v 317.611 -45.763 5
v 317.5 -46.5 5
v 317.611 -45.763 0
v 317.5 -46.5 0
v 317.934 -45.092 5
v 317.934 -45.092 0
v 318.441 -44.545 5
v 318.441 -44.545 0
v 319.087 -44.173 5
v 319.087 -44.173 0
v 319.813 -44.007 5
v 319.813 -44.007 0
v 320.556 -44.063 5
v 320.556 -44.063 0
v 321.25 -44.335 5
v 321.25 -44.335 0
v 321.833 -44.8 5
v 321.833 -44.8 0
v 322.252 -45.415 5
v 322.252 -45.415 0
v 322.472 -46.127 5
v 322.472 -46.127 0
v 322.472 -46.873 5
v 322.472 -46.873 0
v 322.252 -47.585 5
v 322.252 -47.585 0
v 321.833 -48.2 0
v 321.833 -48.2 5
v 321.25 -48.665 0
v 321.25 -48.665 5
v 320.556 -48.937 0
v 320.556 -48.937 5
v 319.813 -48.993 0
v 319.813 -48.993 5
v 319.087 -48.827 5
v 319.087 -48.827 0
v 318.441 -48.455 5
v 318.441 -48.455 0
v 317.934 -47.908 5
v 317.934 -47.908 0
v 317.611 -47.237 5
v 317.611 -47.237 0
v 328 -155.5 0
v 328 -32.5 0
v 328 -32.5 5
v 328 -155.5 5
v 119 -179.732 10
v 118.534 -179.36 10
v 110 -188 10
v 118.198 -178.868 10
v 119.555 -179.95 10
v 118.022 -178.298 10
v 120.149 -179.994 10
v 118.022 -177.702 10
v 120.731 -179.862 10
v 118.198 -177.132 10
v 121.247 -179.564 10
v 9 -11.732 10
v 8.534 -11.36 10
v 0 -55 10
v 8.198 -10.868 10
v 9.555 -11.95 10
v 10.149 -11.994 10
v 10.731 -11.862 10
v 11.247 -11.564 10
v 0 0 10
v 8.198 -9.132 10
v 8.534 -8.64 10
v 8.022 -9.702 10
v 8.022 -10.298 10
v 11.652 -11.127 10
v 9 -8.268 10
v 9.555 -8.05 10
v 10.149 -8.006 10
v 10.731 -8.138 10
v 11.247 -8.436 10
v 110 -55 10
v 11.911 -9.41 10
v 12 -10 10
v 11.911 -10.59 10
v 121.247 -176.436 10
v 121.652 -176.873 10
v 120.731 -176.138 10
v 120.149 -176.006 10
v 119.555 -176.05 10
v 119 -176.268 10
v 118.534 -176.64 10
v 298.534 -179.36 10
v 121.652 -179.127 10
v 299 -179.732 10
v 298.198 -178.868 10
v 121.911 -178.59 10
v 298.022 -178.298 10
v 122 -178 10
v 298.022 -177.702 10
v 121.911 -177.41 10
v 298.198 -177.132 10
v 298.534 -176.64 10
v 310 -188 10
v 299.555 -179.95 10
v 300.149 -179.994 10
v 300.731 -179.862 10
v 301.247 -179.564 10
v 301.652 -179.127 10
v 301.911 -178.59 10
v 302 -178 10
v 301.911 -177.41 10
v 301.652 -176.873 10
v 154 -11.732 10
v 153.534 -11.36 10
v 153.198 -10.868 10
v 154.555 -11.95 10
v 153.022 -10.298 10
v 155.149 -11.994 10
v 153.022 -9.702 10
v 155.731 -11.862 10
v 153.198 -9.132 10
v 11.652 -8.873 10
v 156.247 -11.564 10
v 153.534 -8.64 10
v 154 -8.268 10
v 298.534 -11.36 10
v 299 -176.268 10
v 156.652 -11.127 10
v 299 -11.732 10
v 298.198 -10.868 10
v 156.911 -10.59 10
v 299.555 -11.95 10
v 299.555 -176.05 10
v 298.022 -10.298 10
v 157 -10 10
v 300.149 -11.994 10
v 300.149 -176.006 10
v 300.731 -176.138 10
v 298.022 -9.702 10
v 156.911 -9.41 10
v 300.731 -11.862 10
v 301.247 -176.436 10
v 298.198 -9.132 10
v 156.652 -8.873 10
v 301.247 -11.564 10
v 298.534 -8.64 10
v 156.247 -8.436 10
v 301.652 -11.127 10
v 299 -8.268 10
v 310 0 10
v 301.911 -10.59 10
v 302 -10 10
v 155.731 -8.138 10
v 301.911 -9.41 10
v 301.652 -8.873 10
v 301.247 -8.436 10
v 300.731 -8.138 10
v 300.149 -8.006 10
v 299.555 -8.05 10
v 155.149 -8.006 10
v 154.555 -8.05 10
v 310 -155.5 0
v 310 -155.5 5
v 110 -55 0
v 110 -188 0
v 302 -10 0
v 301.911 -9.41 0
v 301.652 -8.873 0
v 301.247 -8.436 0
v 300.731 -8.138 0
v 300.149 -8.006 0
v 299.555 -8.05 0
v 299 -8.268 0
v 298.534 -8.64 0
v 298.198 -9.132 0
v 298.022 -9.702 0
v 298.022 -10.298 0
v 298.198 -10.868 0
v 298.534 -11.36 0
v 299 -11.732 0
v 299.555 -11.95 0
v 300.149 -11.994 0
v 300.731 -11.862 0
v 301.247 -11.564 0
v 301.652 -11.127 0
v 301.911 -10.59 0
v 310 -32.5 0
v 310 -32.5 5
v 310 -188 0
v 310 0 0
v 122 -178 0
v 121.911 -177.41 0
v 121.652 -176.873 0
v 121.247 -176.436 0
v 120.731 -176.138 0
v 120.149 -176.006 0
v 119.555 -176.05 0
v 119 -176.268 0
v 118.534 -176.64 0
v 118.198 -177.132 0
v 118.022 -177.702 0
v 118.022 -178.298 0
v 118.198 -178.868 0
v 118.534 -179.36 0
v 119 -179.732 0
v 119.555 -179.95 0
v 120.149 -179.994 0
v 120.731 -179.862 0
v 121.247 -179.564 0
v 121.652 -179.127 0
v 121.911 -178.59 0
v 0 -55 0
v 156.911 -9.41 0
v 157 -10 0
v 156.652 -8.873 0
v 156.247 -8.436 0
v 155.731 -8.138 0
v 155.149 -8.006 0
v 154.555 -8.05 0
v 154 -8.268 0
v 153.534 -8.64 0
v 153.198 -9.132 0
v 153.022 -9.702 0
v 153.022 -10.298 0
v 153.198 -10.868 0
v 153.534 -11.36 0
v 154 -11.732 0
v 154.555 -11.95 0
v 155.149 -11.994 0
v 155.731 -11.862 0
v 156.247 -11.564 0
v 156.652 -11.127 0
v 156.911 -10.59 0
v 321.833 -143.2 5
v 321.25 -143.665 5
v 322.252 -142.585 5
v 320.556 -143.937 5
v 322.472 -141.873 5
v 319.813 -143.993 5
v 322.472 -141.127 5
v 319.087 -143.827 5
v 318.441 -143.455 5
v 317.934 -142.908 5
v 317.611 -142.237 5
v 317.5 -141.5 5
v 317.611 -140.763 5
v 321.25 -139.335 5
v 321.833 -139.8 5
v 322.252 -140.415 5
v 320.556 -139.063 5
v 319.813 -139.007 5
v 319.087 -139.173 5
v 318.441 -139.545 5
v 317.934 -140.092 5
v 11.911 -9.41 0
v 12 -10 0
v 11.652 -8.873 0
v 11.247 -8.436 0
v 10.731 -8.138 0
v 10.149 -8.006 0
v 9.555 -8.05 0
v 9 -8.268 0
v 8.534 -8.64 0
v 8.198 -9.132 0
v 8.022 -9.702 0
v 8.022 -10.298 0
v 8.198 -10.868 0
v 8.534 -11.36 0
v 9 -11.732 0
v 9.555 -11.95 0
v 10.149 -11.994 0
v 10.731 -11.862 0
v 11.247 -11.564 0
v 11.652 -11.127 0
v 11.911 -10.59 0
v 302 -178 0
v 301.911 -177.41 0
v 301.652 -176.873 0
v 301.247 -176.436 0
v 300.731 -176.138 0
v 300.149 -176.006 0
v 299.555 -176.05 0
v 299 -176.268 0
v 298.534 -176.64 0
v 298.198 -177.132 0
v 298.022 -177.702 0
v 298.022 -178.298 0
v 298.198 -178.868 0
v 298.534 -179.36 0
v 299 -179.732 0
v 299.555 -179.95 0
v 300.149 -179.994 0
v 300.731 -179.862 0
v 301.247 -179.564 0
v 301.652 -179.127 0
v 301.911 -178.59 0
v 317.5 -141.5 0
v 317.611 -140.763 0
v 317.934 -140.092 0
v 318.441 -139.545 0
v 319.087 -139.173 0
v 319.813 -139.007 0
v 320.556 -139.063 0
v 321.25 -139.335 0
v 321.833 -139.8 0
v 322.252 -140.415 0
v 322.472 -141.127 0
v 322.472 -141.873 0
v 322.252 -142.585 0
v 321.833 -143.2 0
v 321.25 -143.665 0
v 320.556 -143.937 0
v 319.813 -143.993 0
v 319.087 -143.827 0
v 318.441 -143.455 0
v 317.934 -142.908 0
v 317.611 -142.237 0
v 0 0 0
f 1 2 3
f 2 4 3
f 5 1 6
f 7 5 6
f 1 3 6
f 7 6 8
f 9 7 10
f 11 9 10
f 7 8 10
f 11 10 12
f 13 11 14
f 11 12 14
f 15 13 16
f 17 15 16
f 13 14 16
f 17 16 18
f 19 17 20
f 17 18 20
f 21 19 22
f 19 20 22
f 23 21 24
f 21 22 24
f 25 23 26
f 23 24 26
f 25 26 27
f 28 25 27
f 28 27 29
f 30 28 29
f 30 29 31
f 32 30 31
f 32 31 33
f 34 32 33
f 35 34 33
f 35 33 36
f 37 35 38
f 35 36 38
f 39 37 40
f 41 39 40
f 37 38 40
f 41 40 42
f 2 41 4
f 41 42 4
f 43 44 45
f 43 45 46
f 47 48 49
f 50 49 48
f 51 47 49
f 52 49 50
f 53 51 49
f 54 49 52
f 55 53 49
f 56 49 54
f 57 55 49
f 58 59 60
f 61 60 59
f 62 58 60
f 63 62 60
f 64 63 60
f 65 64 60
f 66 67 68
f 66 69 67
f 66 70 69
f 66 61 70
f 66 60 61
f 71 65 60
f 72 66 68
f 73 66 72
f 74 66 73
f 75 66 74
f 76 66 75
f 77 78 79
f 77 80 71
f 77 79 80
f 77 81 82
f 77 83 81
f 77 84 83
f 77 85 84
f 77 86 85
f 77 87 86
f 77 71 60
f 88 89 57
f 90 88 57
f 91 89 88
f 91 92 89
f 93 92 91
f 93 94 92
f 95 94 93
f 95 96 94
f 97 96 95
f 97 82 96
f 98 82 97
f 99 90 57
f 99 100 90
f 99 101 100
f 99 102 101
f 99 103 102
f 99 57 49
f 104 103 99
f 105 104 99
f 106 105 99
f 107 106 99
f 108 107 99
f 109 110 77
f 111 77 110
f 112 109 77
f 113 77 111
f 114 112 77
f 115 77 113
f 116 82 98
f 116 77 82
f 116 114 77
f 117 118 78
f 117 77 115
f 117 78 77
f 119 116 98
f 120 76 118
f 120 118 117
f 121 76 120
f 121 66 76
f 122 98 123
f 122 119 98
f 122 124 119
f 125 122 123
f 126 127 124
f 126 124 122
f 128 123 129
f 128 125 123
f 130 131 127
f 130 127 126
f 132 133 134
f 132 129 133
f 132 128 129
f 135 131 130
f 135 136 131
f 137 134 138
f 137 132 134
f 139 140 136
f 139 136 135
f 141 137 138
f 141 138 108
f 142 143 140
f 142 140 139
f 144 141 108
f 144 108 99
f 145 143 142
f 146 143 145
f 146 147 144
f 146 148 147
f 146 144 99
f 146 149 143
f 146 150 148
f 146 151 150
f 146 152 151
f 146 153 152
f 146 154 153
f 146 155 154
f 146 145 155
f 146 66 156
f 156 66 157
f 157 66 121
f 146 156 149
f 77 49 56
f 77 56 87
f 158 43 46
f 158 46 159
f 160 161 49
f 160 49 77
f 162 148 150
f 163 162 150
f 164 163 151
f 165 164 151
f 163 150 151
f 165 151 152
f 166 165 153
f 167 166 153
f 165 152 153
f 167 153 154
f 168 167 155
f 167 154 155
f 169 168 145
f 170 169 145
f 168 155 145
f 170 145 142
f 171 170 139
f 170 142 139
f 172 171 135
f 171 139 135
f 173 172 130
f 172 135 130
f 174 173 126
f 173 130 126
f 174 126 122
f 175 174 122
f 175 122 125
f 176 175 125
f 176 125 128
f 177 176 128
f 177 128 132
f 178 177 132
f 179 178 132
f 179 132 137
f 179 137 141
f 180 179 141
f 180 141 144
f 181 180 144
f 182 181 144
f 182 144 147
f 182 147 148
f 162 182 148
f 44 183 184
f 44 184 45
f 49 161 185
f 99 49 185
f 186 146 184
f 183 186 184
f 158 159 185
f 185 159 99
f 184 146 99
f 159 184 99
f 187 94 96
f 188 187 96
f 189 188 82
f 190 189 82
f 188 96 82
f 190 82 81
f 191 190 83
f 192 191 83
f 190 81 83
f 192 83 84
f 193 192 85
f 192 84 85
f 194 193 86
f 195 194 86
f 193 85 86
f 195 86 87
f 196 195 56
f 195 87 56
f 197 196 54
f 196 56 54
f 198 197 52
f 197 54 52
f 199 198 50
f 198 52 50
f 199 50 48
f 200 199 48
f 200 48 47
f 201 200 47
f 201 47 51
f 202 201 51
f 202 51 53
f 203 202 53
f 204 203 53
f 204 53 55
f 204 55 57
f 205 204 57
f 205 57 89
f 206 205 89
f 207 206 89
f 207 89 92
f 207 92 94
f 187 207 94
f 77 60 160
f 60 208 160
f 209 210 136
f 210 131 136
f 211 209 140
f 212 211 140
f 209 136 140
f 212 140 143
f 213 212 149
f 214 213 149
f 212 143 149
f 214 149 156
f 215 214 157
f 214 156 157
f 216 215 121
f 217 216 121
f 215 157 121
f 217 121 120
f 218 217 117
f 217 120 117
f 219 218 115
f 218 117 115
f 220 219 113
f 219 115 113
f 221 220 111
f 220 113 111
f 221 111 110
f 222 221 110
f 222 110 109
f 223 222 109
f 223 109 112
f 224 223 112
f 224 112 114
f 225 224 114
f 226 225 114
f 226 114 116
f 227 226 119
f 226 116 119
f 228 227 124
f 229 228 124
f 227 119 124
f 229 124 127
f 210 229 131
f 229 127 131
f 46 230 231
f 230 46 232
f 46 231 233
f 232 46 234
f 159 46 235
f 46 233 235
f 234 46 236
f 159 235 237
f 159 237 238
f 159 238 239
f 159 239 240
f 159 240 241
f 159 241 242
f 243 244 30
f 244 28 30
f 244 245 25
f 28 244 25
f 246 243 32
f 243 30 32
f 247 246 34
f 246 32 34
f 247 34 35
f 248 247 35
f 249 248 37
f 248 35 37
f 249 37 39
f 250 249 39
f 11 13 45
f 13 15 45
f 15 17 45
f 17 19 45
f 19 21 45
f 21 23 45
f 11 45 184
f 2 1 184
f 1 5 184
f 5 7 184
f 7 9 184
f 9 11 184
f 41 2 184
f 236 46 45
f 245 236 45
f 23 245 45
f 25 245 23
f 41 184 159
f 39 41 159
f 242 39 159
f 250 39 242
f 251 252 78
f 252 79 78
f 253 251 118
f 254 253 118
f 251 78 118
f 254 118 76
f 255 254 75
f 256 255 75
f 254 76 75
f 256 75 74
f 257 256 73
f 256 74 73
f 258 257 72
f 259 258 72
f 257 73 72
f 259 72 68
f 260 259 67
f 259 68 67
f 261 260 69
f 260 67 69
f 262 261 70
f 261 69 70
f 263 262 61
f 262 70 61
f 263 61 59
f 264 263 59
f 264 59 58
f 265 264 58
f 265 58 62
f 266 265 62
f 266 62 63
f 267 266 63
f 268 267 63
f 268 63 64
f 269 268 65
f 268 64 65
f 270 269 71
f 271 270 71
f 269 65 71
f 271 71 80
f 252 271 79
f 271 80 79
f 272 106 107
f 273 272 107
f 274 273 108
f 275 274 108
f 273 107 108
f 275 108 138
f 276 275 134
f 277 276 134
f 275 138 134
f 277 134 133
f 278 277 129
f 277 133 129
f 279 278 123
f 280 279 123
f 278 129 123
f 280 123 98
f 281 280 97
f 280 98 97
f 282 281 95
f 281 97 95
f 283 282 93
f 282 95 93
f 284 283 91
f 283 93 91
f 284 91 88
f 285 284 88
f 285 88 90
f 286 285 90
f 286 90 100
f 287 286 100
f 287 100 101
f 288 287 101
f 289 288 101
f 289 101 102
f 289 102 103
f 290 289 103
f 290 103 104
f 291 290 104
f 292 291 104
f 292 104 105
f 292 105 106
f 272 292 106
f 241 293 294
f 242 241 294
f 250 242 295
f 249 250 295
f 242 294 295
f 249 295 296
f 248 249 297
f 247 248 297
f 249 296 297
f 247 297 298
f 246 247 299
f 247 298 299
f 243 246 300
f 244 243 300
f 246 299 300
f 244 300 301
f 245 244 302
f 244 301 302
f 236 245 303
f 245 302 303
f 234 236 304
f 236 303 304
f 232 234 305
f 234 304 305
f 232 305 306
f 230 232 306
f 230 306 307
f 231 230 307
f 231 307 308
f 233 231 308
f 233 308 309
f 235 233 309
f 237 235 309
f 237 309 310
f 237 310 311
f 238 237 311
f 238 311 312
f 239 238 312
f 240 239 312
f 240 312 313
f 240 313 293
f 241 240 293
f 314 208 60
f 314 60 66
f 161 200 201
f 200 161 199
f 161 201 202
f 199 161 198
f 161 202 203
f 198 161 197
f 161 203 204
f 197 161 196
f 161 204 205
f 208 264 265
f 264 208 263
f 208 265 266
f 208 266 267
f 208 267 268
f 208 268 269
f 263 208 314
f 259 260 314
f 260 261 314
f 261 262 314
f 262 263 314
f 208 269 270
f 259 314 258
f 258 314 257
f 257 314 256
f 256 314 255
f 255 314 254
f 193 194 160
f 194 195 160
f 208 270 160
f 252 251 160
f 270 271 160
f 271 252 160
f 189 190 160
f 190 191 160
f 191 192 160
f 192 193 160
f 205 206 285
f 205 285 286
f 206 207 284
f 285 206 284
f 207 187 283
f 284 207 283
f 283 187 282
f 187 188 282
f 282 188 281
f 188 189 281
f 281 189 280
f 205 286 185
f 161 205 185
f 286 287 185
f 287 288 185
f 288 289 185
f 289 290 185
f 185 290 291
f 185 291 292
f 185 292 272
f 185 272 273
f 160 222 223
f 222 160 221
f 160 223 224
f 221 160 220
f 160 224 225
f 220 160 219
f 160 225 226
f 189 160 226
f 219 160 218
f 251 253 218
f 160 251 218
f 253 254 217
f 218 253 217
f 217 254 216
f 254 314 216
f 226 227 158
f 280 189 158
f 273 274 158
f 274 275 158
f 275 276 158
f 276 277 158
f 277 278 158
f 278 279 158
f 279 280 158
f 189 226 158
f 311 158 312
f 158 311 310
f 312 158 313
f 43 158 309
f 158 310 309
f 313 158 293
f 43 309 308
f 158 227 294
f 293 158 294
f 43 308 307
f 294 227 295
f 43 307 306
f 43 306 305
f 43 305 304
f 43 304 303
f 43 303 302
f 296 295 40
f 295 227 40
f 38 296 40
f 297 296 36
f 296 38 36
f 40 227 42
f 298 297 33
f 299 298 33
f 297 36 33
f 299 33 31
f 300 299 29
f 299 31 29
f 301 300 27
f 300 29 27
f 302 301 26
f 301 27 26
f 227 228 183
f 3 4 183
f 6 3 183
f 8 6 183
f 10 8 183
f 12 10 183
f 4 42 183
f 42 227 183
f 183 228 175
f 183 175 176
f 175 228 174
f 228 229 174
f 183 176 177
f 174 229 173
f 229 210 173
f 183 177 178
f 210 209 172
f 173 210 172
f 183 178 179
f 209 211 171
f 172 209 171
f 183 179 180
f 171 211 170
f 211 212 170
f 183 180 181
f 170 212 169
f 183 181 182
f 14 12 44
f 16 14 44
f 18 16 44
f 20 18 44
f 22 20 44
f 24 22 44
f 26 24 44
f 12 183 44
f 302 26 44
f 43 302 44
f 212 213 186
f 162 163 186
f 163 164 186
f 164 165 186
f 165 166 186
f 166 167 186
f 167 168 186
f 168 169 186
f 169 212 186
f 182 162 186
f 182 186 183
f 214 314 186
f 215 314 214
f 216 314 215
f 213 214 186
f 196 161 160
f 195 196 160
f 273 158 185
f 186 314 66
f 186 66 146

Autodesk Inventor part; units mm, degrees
ref_plane "YZ Plane" through (0, 0, 0) normal (1, 0, 0) x (0, 1, 0)
ref_plane "XZ Plane" through (0, 0, 0) normal (0, 1, 0) x (-1, 0, 0)
ref_plane "XY Plane" through (0, 0, 0) normal (0, 0, 1) x (1, 0, 0)
sketch "Sketch1" plane through (0, 0, 0) normal (0, 0, 1) x (1, 0, 0)
  line L0 (0, 0) -> (620, 0)
  line L1 (110, -188) -> (510, -188)
  line L2 (510, -188) -> (510, -55)
  line L3 (510, -55) -> (620, -55)
  line L4 (620, -55) -> (620, 0)
  line L5 (110, -188) -> (110, -55)
  line L6 (0, -55) -> (0, 0)
  line L7 (0, -55) -> (110, -55)
  point P0 (310, -188)
  point P1 (310, 0)
  dimension "d0" = 620
  dimension "d1" = 188
  dimension "d2" = 400
  dimension "d3" = 133
extrude "Extrusion1" add sketch "Sketch1" along normal blind 10
sketch "Sketch2" plane through (0, 0, 10) normal (0, 0, 1) x (1, 0, 0)
  line L0 (620, 0) -> (0, 0) projected
  line L1 (510, -188) -> (110, -188) projected
  line L2 (620, 0) -> (310, 0)
  line L3 (310, 0) -> (310, -188)
  line L4 (310, -188) -> (620, -188)
  line L5 (620, -188) -> (620, 0)
extrude "Extrusion2" cut sketch "Sketch2" against normal through all
sketch "Sketch3" plane through (0, 0, 10) normal (0, 0, 1) x (1, 0, 0)
  circle A0 centre (10, -10) radius 2
  line L0 (310, 0) -> (0, 0) projected
  line L1 (0, 0) -> (0, -55) projected
  circle A1 centre (155, -10) radius 2
  circle A2 centre (300, -10) radius 2
  line L2 (310, -188) -> (310, 0) projected
  line L3 (10, -10) -> (300, -10) construction
  circle A3 centre (120, -178) radius 2
  line L4 (110, -55) -> (110, -188) projected
  line L5 (110, -188) -> (310, -188) projected
  circle A4 centre (300, -178) radius 2
  dimension "d8" = 4
  dimension "d9" = 10
  dimension "d10" = 10
  dimension "d11" = 4
  dimension "d12" = 4
  dimension "d13" = 10
  dimension "d14" = 4
  dimension "d15" = 10
  dimension "d16" = 10
  dimension "d17" = 4
  dimension "d18" = 10
  dimension "d19" = 10
extrude "Extrusion3" cut sketch "Sketch3" against normal through all
sketch "Sketch4" plane through (0, 0, 0) normal (0, 0, -1) x (-1, 0, 0)
  line L0 (-310, 0) -> (-310, -188) projected
  line L1 (-310, -32.5) -> (-328, -32.5)
  line L2 (-328, -32.5) -> (-328, -155.5)
  line L3 (-328, -155.5) -> (-310, -155.5)
  line L4 (-310, -155.5) -> (-310, -32.5)
  circle A0 centre (-320, -46.5) radius 2.5
  circle A1 centre (-320, -141.5) radius 2.5
  line L5 (-320, -46.5) -> (-320, -141.5) construction
  point P0 (0, 0)
  point P1 (-310, -94)
  point P2 (-320, -94)
  dimension "d22" = 18
  dimension "d23" = 123
  dimension "d24" = 5
  dimension "d25" = 5
  dimension "d26" = 10
  dimension "d27" = 95
extrude "Extrusion4" add sketch "Sketch4" against normal blind 5
properties part number "SP001b" material "ABS Plastic"
